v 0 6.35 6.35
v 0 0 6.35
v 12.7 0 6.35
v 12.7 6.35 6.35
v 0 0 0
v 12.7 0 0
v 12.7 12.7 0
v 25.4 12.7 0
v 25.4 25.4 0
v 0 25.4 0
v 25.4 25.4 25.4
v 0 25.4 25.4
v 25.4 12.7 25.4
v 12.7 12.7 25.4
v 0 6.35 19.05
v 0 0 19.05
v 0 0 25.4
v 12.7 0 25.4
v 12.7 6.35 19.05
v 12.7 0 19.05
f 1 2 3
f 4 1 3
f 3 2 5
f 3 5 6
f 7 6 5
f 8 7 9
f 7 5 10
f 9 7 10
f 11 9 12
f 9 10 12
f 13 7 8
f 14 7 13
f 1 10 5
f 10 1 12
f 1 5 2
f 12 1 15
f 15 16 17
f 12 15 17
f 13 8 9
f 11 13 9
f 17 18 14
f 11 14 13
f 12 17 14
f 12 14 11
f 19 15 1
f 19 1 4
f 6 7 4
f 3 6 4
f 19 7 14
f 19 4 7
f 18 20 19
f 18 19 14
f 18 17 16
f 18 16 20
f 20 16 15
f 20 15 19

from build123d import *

# Parameters (mm, degrees)
F0_W     = 12.7
F0_H     = 25.4
F1_DEPTH = 25.4
F3_W     = 12.7
F3_H     = 12.7
F4_DEPTH = 6.35
F5_W     = 12.7
F5_H     = 25.4
F6_DEPTH = 12.7


with BuildPart() as f1:
    # F0 (on Front) → F1 (new body)
    with BuildSketch(Plane.XZ):
        with Locations((6.35, 12.7)):
            Rectangle(F0_W, F0_H)
    extrude(amount=-F1_DEPTH)

    # F3 (on face) → F4 (cut)
    with BuildSketch(Plane.XZ):
        with Locations((6.35, 12.7)):
            Rectangle(F3_W, F3_H)
    extrude(amount=-F4_DEPTH, mode=Mode.SUBTRACT)

    # F5 (on face) → F6 (join)
    with BuildSketch(Plane.YZ.offset(12.7)):
        with Locations((19.05, 12.7)):
            Rectangle(F5_W, F5_H)
    extrude(amount=F6_DEPTH)


solid = f1.part
